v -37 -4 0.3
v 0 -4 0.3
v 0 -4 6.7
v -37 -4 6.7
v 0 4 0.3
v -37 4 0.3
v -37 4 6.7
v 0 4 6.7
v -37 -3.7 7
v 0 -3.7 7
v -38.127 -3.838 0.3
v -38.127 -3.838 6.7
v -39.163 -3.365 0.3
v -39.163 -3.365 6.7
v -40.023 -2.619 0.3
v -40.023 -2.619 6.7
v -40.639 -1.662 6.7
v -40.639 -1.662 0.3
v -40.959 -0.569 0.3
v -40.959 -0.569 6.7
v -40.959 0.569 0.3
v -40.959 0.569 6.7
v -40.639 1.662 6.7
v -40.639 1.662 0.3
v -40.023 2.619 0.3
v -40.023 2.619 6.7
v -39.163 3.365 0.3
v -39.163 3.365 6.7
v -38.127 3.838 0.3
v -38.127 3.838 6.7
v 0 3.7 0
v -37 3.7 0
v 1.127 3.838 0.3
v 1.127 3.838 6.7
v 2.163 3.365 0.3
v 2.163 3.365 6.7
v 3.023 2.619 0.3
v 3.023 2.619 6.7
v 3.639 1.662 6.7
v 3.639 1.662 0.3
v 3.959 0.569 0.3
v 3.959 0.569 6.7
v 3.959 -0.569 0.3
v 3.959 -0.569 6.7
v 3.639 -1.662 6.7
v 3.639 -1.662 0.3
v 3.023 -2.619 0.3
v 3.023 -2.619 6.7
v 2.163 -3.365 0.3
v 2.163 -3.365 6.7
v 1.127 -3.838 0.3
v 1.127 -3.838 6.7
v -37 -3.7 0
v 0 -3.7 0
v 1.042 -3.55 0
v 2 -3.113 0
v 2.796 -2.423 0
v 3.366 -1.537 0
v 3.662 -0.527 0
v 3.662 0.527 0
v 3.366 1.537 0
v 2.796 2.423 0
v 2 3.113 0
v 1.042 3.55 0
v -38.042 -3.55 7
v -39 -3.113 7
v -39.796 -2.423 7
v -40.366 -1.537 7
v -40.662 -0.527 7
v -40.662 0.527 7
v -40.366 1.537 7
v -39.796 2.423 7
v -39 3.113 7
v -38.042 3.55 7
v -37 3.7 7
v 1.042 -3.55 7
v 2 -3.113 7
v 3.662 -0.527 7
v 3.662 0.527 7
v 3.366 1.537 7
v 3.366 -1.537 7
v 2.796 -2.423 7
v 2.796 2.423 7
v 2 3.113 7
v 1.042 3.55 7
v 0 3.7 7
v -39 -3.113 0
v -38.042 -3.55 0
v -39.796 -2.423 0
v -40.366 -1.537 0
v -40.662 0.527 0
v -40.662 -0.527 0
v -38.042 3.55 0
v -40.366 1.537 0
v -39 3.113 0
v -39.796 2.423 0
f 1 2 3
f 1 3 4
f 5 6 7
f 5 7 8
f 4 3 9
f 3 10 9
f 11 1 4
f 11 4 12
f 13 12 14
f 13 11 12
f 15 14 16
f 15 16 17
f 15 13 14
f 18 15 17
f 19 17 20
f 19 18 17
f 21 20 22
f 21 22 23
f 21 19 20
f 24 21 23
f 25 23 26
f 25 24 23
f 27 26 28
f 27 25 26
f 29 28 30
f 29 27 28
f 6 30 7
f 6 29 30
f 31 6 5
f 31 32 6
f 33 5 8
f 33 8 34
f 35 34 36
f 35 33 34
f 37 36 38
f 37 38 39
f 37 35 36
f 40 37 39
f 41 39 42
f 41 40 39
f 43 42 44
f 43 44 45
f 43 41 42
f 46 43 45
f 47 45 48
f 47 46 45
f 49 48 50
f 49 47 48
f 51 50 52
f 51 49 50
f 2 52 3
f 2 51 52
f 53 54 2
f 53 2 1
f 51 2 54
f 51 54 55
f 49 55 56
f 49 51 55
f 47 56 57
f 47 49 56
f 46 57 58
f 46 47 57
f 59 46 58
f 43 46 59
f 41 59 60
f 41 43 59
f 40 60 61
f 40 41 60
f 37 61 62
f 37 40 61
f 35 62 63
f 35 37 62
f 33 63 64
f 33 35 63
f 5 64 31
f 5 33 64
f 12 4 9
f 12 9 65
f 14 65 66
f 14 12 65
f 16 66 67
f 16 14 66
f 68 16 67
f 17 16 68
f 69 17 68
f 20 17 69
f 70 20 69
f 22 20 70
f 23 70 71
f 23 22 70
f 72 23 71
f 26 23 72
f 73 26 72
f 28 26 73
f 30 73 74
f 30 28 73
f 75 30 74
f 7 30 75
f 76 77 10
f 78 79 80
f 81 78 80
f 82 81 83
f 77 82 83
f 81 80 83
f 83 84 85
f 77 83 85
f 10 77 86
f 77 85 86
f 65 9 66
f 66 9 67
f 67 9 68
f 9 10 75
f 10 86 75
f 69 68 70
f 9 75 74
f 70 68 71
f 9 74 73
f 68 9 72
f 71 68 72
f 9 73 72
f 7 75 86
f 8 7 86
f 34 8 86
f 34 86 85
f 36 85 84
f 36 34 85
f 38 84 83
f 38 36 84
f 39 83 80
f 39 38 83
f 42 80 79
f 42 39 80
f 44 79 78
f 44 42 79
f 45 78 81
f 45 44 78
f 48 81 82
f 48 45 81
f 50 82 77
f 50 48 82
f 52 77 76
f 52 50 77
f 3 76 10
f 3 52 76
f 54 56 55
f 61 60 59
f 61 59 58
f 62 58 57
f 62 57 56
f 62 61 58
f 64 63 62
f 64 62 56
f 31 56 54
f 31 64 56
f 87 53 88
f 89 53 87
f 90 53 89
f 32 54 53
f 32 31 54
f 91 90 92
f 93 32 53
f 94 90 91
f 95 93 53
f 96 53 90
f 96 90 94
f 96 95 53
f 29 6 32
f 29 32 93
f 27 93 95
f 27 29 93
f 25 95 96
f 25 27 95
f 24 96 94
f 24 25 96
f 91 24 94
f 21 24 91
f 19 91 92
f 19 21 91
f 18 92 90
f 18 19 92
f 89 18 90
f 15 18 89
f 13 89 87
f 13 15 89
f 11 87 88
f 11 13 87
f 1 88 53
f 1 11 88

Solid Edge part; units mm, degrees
sketch "Sketch1" plane through (10.8674, 10.8674, 0) normal (0, 0, 1) x (1, 0, 0)
  line L0 (-47.8674, -6.8674) -> (-10.8674, -6.8674)
  arc A0 (-10.8674, -6.8674) -> (-10.8674, -14.8674) centre (-10.8674, -10.8674) cw
  line L1 (-10.8674, -14.8674) -> (-47.8674, -14.8674)
  arc A1 (-47.8674, -6.8674) -> (-47.8674, -14.8674) centre (-47.8674, -10.8674) ccw
  dimension "D1" = 8
extrude "Protrusion1" add sketch "Sketch1" along normal blind 7
chamfer "Chamfer_1" distance 0.3 angle 45 8 edges at (-18.5, -4, 7) (-41, 0, 7) (-18.5, 4, 7) (4, 0, 7) (-18.5, -4, 0) (-41, 0, 0) (-18.5, 4, 0) (4, 0, 0)
properties material "Steel"
